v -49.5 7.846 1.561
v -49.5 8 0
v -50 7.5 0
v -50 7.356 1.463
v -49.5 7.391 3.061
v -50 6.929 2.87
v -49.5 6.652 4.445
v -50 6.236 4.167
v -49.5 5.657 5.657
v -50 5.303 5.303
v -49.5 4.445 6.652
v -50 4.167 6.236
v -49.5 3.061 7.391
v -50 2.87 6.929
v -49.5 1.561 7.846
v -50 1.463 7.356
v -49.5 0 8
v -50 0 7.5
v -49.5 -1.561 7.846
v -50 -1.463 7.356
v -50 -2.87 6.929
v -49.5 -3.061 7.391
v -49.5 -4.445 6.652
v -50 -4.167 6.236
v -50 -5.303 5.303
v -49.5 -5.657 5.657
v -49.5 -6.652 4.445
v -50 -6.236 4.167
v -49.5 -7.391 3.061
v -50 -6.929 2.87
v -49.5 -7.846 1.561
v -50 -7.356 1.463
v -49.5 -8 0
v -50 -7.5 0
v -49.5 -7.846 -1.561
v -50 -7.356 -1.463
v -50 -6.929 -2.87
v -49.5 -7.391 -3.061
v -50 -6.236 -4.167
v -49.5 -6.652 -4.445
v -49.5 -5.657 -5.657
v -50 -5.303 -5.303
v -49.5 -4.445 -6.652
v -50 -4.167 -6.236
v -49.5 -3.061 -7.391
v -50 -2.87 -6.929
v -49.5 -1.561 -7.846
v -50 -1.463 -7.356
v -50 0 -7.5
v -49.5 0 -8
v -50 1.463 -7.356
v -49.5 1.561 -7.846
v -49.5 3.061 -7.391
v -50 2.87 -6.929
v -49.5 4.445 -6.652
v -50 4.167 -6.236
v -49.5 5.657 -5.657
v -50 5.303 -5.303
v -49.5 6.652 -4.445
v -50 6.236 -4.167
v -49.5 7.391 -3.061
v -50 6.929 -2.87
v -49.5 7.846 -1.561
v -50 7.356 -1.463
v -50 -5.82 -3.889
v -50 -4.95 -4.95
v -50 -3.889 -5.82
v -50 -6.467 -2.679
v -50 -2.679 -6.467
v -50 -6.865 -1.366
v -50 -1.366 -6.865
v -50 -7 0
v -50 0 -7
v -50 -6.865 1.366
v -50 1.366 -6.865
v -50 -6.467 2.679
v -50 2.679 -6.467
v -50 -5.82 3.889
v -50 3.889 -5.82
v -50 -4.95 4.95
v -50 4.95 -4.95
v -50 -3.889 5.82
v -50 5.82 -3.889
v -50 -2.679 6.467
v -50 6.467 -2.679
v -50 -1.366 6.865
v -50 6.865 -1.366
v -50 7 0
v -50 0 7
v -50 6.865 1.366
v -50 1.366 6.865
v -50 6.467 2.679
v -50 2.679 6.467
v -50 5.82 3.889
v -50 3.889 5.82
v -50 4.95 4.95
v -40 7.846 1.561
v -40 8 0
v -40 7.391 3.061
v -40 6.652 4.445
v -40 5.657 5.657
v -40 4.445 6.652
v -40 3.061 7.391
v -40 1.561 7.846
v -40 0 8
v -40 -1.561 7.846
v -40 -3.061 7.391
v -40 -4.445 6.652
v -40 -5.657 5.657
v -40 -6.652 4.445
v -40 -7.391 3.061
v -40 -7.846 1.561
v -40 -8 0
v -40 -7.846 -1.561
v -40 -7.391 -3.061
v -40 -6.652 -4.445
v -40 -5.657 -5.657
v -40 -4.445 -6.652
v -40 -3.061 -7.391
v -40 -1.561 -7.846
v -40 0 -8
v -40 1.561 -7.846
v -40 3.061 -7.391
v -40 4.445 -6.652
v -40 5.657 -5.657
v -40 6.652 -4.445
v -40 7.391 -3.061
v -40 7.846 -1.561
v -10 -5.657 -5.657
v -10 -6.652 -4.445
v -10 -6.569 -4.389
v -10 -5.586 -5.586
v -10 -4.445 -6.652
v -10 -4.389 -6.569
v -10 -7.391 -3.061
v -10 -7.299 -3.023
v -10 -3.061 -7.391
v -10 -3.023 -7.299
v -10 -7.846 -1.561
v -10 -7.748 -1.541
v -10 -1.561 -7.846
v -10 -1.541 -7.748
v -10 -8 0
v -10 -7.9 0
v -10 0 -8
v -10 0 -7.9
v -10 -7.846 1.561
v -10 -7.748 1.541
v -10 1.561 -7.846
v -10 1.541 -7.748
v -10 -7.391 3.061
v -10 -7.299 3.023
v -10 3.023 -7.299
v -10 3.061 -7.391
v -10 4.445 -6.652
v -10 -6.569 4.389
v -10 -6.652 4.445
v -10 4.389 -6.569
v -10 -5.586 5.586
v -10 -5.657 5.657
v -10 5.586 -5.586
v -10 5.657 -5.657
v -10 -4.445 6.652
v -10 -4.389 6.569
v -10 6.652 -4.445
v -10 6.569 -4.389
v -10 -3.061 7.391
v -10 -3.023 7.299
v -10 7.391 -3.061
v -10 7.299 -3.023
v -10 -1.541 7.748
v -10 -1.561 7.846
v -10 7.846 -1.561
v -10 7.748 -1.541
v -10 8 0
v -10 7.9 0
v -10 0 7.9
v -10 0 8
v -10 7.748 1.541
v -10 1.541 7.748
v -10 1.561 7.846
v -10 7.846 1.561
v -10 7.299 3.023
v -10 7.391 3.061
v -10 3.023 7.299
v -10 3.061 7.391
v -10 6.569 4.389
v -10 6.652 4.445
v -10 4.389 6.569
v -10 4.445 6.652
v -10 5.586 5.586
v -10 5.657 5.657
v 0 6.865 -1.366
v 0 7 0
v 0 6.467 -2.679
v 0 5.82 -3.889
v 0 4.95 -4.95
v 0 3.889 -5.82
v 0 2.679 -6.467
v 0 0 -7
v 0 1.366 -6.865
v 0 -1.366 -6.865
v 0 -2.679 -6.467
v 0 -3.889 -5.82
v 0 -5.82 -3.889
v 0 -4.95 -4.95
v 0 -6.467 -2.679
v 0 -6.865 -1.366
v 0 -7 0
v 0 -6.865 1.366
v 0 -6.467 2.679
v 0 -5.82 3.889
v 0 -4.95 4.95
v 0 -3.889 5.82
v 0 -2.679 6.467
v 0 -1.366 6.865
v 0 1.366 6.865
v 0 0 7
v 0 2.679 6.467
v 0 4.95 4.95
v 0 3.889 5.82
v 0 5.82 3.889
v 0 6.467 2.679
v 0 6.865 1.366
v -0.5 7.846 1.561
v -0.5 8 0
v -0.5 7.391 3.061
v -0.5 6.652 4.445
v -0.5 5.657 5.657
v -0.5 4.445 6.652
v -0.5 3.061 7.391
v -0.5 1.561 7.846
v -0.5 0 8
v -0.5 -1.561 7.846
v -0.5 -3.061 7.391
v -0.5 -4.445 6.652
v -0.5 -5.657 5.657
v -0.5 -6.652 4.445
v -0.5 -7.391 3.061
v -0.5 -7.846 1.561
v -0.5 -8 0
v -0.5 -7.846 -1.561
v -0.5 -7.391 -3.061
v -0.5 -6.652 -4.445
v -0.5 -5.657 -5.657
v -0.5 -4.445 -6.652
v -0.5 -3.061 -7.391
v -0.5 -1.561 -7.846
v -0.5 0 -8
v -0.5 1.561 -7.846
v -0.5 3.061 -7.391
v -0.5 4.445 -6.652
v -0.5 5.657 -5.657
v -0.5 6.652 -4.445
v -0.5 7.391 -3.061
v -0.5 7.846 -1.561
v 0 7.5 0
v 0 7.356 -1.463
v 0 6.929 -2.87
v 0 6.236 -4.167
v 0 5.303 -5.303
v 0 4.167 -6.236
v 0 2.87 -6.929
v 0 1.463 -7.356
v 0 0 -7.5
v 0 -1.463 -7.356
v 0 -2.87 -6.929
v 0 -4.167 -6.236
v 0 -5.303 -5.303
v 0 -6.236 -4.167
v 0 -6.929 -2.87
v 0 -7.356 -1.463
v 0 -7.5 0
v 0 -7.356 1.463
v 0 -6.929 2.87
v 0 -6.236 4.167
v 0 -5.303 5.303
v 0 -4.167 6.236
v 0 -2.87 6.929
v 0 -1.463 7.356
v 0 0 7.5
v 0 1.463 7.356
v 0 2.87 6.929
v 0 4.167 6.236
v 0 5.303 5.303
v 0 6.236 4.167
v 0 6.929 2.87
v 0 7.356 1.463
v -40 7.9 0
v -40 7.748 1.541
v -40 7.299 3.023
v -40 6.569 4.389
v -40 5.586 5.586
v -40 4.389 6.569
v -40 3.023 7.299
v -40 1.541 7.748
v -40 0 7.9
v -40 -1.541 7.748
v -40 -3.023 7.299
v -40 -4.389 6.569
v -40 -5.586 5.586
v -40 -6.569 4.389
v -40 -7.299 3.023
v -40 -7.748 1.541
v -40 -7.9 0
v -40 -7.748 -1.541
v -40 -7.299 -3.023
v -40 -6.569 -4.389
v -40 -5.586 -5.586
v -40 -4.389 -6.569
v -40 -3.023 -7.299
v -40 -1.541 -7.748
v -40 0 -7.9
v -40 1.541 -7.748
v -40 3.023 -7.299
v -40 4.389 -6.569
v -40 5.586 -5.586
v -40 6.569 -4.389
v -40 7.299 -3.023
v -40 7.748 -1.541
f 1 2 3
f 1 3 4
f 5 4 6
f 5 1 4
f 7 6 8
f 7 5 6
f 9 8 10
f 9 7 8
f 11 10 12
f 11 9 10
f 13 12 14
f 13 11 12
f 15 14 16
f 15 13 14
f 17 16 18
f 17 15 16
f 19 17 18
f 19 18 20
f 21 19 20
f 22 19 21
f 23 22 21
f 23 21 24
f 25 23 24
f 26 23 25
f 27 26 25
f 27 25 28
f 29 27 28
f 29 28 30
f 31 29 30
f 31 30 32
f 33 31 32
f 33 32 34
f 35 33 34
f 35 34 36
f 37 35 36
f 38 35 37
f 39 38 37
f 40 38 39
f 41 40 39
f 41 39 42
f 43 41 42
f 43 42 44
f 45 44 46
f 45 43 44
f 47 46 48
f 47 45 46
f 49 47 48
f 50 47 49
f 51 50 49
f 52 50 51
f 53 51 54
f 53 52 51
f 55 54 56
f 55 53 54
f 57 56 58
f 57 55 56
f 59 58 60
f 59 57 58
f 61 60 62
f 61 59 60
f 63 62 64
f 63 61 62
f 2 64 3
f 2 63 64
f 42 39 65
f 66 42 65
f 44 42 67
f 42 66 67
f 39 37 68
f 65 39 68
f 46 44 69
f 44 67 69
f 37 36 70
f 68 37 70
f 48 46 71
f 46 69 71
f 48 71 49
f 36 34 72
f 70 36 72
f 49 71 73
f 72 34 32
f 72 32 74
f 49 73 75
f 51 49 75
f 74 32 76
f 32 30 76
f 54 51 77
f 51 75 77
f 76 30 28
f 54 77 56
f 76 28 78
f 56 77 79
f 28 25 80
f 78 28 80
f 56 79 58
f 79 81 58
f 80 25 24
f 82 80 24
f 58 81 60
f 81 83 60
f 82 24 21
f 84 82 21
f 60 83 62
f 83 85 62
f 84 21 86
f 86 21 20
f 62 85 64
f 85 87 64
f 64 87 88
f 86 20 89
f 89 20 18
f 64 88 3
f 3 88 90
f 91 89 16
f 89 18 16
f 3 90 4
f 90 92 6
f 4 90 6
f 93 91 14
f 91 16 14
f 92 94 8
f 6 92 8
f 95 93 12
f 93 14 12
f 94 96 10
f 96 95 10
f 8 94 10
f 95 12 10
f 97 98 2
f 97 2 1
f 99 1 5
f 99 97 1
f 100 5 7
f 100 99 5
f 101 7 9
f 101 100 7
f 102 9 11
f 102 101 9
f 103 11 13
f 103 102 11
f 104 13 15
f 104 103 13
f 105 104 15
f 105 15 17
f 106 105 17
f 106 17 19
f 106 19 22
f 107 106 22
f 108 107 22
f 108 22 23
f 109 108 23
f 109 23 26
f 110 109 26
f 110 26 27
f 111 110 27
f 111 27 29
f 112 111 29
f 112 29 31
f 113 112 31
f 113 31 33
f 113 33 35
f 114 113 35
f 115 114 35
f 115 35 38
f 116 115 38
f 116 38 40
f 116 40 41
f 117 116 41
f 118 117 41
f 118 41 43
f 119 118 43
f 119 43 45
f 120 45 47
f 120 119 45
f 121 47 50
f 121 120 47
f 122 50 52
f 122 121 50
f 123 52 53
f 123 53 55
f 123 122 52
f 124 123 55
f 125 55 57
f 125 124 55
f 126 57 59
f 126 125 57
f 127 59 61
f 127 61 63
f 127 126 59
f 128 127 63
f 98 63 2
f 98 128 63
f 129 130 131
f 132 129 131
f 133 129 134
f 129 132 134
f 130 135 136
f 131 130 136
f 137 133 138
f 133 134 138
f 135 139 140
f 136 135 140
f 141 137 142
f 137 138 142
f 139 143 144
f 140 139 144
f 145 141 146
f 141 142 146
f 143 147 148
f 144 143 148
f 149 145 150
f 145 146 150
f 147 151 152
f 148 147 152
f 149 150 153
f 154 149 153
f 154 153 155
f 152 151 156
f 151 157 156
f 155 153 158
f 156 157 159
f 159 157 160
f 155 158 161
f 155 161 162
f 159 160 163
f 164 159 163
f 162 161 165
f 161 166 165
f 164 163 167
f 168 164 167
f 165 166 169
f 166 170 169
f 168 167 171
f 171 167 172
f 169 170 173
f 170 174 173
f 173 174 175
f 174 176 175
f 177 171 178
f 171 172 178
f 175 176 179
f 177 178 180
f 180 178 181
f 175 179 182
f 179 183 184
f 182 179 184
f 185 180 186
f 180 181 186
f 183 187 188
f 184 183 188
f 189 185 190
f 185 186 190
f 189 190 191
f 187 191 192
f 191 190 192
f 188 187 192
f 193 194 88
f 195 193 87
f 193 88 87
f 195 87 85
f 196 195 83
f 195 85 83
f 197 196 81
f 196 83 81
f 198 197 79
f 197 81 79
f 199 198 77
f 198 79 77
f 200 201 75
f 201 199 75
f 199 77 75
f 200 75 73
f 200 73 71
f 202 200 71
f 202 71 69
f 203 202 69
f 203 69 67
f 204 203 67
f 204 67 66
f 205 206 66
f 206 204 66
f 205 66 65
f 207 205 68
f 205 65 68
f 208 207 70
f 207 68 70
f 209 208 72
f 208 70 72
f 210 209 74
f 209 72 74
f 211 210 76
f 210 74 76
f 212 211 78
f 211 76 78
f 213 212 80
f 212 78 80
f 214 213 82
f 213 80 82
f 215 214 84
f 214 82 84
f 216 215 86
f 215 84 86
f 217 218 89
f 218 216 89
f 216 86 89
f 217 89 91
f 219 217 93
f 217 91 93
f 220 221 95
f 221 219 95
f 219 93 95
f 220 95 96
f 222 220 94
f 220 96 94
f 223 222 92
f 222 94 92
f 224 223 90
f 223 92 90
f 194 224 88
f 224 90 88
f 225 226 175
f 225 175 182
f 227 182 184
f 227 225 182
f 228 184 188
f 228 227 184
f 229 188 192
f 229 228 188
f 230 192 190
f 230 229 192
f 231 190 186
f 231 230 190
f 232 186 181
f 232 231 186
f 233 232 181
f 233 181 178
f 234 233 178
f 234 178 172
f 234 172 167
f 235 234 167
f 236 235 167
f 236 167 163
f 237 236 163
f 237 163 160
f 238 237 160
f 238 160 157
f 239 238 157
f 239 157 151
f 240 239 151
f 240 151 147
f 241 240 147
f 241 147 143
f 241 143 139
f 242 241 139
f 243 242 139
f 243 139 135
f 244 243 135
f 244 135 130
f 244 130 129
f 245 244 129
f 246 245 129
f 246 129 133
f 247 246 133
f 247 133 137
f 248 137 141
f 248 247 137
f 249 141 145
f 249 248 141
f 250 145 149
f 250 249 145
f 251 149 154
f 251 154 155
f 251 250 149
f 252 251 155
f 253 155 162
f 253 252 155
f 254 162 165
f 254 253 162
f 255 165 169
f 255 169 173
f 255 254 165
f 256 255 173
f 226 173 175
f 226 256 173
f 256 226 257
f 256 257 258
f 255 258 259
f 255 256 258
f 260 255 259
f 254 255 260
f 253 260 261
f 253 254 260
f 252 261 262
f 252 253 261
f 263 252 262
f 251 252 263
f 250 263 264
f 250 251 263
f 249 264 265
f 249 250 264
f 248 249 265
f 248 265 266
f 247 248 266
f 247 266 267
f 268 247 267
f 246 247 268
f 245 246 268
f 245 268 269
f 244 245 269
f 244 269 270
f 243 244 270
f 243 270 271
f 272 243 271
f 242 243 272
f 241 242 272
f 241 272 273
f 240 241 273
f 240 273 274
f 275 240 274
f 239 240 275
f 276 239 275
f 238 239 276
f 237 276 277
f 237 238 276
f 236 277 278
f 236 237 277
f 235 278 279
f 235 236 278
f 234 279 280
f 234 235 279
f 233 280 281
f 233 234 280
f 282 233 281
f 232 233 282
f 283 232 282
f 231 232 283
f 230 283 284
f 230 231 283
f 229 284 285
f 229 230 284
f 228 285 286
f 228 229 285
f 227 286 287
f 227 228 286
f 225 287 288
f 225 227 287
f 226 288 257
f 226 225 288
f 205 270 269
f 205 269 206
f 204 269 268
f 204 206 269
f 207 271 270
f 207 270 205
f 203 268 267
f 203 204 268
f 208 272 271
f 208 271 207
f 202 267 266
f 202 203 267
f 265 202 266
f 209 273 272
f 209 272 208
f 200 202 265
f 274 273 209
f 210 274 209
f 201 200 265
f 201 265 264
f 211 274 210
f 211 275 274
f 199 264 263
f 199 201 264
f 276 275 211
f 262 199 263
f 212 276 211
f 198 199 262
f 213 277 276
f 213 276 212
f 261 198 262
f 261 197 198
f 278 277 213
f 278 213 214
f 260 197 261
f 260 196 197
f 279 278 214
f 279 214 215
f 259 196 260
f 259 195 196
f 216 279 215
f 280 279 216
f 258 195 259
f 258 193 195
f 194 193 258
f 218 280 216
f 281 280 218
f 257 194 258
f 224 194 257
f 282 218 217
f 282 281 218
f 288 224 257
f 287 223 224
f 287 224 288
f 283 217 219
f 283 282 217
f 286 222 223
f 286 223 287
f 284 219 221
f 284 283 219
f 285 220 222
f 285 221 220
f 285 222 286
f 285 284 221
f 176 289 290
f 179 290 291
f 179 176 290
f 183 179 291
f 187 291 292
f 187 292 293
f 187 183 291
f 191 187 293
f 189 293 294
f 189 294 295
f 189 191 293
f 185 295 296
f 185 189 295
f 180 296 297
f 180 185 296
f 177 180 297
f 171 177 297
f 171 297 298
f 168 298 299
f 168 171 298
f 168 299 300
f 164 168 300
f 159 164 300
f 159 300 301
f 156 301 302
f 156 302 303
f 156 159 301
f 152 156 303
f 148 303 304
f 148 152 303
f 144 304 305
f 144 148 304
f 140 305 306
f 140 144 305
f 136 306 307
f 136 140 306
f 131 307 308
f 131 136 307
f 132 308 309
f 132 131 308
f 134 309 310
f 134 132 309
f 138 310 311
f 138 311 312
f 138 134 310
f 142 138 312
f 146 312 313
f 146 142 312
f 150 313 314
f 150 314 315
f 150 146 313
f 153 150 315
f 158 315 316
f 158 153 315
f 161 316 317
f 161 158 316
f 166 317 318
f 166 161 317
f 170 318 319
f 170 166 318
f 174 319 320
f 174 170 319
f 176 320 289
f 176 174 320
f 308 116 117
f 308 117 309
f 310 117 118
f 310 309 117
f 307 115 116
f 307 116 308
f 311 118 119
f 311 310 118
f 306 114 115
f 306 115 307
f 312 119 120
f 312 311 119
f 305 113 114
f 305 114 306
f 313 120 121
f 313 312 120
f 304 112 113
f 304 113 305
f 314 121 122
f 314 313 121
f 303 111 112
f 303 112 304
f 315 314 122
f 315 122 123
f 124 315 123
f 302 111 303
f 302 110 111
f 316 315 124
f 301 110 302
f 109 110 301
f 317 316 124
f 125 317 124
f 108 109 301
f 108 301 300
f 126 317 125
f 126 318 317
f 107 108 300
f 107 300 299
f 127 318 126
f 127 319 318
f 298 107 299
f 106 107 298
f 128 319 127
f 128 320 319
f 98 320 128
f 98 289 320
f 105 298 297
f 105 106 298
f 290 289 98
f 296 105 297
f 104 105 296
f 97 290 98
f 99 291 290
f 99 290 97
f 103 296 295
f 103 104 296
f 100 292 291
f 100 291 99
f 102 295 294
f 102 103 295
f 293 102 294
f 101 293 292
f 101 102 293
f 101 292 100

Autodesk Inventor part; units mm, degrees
ref_plane "YZ Plane" through (0, 0, 0) normal (1, 0, 0) x (0, 1, 0)
ref_plane "XZ Plane" through (0, 0, 0) normal (0, 1, 0) x (-1, 0, 0)
ref_plane "XY Plane" through (0, 0, 0) normal (0, 0, 1) x (1, 0, 0)
sketch "Skizze1" plane through (0, 0, 0) normal (0, 0, 1) x (1, 0, 0)
  line L0 (-60, 0) -> (10, 0) projected
  line L1 (0, -1.6) -> (0, 9.6) projected
  line L2 (0, 7) -> (-50, 7)
  line L3 (-50, 7) -> (-50, 8)
  line L4 (-50, 8) -> (-40, 8)
  line L5 (-40, 8) -> (-40, 7.9)
  line L6 (-40, 7.9) -> (-10, 7.9)
  line L7 (-10, 7.9) -> (-10, 8)
  line L8 (-10, 8) -> (0, 8)
  line L9 (0, 7) -> (0, 8)
  point P0 (0, 0)
  dimension "d1" = 14
  dimension "d2" = 16
  dimension "d4" = 50
  dimension "d5" = 10
  dimension "d6" = 10
  dimension "d11" = 0.1
revolve "Umdrehung1" add sketch "Skizze1" angle 360 about axis through (-10, 0, 0) along (1, 0, 0)
chamfer "Fase1" distance 0.5 angle 45 2 edges at (0, -8, 0) (-50, -8, 0)
properties part number "13_0204_033"
